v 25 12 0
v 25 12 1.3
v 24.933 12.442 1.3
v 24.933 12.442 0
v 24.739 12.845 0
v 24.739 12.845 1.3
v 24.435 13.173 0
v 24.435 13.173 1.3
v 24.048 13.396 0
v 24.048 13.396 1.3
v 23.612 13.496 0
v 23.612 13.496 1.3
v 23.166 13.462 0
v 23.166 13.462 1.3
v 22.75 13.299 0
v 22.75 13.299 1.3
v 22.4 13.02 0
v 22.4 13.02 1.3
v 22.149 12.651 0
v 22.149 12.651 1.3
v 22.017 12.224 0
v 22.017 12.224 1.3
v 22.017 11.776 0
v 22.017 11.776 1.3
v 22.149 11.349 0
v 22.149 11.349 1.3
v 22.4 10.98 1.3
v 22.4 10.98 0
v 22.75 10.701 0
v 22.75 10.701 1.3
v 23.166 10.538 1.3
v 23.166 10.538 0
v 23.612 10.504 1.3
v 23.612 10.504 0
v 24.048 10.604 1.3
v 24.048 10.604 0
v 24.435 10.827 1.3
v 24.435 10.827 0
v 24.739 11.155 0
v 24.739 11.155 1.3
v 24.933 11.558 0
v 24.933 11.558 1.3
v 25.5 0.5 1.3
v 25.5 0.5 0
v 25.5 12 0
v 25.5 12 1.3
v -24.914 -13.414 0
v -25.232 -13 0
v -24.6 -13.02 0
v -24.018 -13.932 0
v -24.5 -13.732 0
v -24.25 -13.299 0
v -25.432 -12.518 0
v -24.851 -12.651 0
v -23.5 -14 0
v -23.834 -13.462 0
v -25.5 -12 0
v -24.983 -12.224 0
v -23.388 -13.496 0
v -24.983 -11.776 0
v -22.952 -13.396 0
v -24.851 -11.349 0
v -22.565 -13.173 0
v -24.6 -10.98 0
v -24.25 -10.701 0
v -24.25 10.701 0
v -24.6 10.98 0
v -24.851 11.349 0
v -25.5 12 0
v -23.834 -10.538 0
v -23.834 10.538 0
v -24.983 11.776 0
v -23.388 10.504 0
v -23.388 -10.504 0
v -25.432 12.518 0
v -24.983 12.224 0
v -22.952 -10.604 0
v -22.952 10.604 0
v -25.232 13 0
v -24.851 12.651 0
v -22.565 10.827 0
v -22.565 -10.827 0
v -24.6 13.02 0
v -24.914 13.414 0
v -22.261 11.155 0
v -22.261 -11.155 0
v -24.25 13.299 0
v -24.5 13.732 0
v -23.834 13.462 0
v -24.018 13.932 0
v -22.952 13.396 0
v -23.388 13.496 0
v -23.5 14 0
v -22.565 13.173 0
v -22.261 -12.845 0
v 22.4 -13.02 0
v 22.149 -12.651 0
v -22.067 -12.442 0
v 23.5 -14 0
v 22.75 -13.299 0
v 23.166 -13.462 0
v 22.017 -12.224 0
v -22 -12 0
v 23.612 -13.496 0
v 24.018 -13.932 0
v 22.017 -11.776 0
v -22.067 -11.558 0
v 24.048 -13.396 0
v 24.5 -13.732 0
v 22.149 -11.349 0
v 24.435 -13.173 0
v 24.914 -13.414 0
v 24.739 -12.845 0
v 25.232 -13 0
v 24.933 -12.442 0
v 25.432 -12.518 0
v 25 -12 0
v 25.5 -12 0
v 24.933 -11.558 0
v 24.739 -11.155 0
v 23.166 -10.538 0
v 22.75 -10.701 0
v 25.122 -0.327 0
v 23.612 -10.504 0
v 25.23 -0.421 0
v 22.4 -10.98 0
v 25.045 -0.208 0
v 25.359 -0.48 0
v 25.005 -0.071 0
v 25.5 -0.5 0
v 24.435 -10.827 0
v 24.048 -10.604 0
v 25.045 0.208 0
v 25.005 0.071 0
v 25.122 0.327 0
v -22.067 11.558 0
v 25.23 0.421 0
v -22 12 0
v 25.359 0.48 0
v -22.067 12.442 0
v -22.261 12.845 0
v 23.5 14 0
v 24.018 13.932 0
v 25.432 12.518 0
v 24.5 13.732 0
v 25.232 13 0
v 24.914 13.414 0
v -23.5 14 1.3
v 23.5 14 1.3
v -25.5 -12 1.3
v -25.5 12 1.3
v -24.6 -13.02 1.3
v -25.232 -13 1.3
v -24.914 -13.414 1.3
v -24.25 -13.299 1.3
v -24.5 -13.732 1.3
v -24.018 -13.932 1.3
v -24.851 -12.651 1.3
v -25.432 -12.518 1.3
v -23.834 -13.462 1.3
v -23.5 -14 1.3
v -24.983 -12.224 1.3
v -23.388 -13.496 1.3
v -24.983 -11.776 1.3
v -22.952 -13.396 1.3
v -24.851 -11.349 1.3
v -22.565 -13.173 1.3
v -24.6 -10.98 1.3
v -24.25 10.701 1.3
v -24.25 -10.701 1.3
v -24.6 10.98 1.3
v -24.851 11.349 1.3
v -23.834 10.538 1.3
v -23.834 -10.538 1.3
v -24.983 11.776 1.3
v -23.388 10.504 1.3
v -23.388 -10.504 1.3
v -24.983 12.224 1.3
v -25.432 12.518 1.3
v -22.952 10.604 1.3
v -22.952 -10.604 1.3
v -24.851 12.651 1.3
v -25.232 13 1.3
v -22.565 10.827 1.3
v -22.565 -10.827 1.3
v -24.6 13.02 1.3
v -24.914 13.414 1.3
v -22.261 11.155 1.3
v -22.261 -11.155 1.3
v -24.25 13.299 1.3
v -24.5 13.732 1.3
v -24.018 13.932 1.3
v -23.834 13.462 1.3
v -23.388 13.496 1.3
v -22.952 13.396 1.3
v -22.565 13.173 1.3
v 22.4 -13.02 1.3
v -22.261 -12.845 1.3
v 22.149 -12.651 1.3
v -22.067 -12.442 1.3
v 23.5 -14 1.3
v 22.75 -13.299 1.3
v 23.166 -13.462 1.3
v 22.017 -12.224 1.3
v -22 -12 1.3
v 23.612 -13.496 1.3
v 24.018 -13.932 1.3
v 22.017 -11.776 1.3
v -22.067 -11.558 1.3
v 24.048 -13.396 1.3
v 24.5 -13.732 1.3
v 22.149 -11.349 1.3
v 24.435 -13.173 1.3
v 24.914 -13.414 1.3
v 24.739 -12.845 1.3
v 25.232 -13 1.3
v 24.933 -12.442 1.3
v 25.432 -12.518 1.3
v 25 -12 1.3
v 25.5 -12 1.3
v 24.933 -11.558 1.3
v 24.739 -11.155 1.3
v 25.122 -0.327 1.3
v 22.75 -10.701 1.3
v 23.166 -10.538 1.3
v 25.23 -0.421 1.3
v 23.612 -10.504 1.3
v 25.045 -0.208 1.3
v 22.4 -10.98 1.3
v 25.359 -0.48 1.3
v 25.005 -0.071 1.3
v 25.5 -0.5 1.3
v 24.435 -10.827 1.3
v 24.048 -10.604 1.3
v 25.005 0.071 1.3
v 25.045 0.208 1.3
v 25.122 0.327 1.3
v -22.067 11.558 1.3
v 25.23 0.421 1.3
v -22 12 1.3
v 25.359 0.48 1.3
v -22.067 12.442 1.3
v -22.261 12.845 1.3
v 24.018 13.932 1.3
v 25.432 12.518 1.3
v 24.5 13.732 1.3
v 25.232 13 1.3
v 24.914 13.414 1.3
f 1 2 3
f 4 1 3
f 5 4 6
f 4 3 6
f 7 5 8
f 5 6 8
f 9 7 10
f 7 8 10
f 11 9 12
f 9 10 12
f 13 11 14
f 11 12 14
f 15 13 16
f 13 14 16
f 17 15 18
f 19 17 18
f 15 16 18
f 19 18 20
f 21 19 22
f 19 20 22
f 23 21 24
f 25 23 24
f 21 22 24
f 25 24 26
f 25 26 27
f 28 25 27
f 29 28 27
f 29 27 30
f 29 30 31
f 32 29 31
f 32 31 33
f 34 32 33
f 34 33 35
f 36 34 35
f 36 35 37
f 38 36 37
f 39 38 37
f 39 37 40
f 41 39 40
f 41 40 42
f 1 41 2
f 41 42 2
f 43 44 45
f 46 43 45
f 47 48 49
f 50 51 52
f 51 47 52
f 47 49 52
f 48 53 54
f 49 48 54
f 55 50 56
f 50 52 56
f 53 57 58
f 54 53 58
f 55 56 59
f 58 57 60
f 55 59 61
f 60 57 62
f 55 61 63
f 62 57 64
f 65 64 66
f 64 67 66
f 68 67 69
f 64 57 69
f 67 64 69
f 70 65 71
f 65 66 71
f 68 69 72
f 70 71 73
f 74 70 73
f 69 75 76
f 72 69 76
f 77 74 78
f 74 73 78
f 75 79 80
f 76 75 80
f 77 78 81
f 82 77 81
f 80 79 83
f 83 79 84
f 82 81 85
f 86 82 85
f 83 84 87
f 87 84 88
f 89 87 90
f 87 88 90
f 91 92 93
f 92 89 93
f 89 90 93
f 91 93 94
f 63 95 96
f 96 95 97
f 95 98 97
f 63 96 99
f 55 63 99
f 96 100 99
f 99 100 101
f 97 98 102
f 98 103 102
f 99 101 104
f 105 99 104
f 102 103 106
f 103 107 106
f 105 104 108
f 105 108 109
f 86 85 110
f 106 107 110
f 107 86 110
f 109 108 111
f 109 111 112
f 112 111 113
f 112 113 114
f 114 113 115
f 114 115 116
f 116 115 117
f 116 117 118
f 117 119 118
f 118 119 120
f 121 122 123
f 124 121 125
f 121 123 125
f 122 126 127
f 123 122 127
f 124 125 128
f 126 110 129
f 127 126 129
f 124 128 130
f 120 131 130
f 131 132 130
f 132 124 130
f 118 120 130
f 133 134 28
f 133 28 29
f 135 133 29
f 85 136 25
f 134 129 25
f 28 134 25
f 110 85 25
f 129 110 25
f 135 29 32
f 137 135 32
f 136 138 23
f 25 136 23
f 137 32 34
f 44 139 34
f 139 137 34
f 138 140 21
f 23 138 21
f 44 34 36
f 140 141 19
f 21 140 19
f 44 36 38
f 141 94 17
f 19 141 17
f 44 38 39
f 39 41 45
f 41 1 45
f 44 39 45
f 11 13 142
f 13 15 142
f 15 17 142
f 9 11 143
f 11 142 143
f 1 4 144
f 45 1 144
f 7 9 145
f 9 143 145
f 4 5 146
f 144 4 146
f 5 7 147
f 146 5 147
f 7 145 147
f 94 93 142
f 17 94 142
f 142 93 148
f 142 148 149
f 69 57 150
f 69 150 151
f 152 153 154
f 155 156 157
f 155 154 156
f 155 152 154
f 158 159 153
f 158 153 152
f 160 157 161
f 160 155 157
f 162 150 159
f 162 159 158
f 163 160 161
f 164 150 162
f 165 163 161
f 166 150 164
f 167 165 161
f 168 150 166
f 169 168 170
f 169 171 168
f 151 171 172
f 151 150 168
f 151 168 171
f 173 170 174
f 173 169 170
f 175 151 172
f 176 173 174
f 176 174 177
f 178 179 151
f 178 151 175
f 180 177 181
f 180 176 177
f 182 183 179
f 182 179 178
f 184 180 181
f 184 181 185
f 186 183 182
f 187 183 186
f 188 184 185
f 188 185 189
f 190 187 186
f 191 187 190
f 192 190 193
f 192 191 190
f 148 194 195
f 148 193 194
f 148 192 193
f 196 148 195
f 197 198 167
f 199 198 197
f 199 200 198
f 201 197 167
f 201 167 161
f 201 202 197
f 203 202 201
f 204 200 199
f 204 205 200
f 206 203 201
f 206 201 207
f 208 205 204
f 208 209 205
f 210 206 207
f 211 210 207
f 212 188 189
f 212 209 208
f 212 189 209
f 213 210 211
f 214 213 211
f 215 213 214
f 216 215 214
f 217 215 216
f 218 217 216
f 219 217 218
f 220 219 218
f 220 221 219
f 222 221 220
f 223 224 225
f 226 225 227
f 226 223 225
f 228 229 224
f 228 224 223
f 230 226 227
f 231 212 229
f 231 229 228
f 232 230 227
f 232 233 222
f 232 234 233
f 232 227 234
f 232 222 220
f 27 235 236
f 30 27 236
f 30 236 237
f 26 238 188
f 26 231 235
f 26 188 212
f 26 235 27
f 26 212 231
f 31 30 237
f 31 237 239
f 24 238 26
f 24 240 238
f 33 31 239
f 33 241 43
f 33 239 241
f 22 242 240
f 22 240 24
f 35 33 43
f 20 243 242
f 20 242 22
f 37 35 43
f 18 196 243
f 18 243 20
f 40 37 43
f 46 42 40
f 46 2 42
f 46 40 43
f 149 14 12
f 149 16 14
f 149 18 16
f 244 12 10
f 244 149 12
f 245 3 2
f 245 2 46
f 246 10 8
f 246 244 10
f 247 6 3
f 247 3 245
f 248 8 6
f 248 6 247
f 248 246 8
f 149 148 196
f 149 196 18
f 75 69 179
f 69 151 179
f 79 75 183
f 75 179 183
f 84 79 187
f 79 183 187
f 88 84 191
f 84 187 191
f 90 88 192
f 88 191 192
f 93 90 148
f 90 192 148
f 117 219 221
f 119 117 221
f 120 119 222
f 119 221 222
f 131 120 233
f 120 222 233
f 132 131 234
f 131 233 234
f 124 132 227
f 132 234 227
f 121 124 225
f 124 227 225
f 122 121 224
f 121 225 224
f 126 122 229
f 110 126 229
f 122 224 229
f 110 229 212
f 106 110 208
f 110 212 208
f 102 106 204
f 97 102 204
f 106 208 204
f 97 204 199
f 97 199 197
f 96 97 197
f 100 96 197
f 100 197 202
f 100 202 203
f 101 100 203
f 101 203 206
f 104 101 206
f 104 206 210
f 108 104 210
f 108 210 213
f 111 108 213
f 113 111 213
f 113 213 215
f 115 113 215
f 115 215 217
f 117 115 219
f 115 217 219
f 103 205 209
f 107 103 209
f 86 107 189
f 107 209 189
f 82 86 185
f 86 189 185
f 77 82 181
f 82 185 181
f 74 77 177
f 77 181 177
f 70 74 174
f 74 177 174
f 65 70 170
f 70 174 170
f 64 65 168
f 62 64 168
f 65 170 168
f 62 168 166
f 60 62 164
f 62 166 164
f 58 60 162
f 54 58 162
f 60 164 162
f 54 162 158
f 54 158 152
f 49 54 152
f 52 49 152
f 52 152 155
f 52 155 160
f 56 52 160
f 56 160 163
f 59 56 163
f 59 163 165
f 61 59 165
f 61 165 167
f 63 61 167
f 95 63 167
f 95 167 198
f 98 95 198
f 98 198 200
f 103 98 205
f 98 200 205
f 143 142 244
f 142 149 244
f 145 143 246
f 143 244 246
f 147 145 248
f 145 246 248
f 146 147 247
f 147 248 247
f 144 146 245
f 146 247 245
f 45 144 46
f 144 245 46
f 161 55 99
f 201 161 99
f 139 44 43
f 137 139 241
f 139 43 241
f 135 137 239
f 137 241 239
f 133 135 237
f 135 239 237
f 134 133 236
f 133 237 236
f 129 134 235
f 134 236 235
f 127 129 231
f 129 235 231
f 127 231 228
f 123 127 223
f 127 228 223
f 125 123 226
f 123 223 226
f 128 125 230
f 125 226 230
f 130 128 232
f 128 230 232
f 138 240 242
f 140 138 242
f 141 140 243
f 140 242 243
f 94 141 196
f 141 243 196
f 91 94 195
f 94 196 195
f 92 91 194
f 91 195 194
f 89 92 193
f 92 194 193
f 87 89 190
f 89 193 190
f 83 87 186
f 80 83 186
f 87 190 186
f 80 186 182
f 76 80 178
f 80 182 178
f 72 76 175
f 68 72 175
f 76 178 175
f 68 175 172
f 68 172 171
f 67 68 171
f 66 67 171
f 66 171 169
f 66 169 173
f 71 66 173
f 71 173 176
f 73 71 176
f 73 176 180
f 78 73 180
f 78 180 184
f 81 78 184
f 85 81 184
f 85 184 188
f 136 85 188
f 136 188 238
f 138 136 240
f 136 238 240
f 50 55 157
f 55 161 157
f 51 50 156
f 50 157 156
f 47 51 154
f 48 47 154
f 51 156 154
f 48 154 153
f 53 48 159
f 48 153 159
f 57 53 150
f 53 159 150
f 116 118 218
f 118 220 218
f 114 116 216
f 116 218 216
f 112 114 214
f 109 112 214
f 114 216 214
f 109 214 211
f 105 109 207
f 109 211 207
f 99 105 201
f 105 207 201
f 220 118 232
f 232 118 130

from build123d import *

# Parameters (mm, degrees)
SKETCH_1_W          = 51
SKETCH_1_H          = 28
EXTRUDE_1_DEPTH     = 1.3
SKETCH_2_R          = 1.5
CUT_EXTRUDE_1_DEPTH = 1.3
FILLET_1_R          = 2
FILLET_2_R          = 2
FILLET_3_R          = 2
FILLET_4_R          = 2
SKETCH_4_R          = 0.5
CUT_EXTRUDE_2_DEPTH = 8.8


with BuildPart() as part:
    # Эскиз1 → Бобышка-Вытянуть1 (new body)
    with BuildSketch(Plane.XY):
        Rectangle(SKETCH_1_W, SKETCH_1_H)
    extrude(amount=EXTRUDE_1_DEPTH)

    # Эскиз2 → Вырез-Вытянуть1 (cut)
    with BuildSketch(Plane.XY.offset(1.3)):
        with Locations((23.5, 12)):
            Circle(SKETCH_2_R)
        with Locations((23.5, -12)):
            Circle(SKETCH_2_R)
        with Locations((-23.5, -12)):
            Circle(SKETCH_2_R)
        with Locations((-23.5, 12)):
            Circle(SKETCH_2_R)
    extrude(amount=-CUT_EXTRUDE_1_DEPTH, mode=Mode.SUBTRACT)

    # Скругление1
    fillet_1_edges = [part.edges().sort_by_distance(p)[0] for p in [
        (25.5, 14, 0.65),
    ]]
    fillet(fillet_1_edges, radius=FILLET_1_R)

    # Скругление2
    fillet_2_edges = [part.edges().sort_by_distance(p)[0] for p in [
        (25.5, -14, 0.65),
    ]]
    fillet(fillet_2_edges, radius=FILLET_2_R)

    # Скругление3
    fillet_3_edges = [part.edges().sort_by_distance(p)[0] for p in [
        (-25.5, -14, 0.65),
    ]]
    fillet(fillet_3_edges, radius=FILLET_3_R)

    # Скругление4
    fillet_4_edges = [part.edges().sort_by_distance(p)[0] for p in [
        (-25.5, 14, 0.65),
    ]]
    fillet(fillet_4_edges, radius=FILLET_4_R)

    # Эскиз4 → Вырез-Вытянуть2 (cut)
    with BuildSketch(Plane.XY.offset(1.3)):
        with Locations((25.5, 0)):
            Circle(SKETCH_4_R)
    extrude(amount=-CUT_EXTRUDE_2_DEPTH, mode=Mode.SUBTRACT)


solid = part.part
